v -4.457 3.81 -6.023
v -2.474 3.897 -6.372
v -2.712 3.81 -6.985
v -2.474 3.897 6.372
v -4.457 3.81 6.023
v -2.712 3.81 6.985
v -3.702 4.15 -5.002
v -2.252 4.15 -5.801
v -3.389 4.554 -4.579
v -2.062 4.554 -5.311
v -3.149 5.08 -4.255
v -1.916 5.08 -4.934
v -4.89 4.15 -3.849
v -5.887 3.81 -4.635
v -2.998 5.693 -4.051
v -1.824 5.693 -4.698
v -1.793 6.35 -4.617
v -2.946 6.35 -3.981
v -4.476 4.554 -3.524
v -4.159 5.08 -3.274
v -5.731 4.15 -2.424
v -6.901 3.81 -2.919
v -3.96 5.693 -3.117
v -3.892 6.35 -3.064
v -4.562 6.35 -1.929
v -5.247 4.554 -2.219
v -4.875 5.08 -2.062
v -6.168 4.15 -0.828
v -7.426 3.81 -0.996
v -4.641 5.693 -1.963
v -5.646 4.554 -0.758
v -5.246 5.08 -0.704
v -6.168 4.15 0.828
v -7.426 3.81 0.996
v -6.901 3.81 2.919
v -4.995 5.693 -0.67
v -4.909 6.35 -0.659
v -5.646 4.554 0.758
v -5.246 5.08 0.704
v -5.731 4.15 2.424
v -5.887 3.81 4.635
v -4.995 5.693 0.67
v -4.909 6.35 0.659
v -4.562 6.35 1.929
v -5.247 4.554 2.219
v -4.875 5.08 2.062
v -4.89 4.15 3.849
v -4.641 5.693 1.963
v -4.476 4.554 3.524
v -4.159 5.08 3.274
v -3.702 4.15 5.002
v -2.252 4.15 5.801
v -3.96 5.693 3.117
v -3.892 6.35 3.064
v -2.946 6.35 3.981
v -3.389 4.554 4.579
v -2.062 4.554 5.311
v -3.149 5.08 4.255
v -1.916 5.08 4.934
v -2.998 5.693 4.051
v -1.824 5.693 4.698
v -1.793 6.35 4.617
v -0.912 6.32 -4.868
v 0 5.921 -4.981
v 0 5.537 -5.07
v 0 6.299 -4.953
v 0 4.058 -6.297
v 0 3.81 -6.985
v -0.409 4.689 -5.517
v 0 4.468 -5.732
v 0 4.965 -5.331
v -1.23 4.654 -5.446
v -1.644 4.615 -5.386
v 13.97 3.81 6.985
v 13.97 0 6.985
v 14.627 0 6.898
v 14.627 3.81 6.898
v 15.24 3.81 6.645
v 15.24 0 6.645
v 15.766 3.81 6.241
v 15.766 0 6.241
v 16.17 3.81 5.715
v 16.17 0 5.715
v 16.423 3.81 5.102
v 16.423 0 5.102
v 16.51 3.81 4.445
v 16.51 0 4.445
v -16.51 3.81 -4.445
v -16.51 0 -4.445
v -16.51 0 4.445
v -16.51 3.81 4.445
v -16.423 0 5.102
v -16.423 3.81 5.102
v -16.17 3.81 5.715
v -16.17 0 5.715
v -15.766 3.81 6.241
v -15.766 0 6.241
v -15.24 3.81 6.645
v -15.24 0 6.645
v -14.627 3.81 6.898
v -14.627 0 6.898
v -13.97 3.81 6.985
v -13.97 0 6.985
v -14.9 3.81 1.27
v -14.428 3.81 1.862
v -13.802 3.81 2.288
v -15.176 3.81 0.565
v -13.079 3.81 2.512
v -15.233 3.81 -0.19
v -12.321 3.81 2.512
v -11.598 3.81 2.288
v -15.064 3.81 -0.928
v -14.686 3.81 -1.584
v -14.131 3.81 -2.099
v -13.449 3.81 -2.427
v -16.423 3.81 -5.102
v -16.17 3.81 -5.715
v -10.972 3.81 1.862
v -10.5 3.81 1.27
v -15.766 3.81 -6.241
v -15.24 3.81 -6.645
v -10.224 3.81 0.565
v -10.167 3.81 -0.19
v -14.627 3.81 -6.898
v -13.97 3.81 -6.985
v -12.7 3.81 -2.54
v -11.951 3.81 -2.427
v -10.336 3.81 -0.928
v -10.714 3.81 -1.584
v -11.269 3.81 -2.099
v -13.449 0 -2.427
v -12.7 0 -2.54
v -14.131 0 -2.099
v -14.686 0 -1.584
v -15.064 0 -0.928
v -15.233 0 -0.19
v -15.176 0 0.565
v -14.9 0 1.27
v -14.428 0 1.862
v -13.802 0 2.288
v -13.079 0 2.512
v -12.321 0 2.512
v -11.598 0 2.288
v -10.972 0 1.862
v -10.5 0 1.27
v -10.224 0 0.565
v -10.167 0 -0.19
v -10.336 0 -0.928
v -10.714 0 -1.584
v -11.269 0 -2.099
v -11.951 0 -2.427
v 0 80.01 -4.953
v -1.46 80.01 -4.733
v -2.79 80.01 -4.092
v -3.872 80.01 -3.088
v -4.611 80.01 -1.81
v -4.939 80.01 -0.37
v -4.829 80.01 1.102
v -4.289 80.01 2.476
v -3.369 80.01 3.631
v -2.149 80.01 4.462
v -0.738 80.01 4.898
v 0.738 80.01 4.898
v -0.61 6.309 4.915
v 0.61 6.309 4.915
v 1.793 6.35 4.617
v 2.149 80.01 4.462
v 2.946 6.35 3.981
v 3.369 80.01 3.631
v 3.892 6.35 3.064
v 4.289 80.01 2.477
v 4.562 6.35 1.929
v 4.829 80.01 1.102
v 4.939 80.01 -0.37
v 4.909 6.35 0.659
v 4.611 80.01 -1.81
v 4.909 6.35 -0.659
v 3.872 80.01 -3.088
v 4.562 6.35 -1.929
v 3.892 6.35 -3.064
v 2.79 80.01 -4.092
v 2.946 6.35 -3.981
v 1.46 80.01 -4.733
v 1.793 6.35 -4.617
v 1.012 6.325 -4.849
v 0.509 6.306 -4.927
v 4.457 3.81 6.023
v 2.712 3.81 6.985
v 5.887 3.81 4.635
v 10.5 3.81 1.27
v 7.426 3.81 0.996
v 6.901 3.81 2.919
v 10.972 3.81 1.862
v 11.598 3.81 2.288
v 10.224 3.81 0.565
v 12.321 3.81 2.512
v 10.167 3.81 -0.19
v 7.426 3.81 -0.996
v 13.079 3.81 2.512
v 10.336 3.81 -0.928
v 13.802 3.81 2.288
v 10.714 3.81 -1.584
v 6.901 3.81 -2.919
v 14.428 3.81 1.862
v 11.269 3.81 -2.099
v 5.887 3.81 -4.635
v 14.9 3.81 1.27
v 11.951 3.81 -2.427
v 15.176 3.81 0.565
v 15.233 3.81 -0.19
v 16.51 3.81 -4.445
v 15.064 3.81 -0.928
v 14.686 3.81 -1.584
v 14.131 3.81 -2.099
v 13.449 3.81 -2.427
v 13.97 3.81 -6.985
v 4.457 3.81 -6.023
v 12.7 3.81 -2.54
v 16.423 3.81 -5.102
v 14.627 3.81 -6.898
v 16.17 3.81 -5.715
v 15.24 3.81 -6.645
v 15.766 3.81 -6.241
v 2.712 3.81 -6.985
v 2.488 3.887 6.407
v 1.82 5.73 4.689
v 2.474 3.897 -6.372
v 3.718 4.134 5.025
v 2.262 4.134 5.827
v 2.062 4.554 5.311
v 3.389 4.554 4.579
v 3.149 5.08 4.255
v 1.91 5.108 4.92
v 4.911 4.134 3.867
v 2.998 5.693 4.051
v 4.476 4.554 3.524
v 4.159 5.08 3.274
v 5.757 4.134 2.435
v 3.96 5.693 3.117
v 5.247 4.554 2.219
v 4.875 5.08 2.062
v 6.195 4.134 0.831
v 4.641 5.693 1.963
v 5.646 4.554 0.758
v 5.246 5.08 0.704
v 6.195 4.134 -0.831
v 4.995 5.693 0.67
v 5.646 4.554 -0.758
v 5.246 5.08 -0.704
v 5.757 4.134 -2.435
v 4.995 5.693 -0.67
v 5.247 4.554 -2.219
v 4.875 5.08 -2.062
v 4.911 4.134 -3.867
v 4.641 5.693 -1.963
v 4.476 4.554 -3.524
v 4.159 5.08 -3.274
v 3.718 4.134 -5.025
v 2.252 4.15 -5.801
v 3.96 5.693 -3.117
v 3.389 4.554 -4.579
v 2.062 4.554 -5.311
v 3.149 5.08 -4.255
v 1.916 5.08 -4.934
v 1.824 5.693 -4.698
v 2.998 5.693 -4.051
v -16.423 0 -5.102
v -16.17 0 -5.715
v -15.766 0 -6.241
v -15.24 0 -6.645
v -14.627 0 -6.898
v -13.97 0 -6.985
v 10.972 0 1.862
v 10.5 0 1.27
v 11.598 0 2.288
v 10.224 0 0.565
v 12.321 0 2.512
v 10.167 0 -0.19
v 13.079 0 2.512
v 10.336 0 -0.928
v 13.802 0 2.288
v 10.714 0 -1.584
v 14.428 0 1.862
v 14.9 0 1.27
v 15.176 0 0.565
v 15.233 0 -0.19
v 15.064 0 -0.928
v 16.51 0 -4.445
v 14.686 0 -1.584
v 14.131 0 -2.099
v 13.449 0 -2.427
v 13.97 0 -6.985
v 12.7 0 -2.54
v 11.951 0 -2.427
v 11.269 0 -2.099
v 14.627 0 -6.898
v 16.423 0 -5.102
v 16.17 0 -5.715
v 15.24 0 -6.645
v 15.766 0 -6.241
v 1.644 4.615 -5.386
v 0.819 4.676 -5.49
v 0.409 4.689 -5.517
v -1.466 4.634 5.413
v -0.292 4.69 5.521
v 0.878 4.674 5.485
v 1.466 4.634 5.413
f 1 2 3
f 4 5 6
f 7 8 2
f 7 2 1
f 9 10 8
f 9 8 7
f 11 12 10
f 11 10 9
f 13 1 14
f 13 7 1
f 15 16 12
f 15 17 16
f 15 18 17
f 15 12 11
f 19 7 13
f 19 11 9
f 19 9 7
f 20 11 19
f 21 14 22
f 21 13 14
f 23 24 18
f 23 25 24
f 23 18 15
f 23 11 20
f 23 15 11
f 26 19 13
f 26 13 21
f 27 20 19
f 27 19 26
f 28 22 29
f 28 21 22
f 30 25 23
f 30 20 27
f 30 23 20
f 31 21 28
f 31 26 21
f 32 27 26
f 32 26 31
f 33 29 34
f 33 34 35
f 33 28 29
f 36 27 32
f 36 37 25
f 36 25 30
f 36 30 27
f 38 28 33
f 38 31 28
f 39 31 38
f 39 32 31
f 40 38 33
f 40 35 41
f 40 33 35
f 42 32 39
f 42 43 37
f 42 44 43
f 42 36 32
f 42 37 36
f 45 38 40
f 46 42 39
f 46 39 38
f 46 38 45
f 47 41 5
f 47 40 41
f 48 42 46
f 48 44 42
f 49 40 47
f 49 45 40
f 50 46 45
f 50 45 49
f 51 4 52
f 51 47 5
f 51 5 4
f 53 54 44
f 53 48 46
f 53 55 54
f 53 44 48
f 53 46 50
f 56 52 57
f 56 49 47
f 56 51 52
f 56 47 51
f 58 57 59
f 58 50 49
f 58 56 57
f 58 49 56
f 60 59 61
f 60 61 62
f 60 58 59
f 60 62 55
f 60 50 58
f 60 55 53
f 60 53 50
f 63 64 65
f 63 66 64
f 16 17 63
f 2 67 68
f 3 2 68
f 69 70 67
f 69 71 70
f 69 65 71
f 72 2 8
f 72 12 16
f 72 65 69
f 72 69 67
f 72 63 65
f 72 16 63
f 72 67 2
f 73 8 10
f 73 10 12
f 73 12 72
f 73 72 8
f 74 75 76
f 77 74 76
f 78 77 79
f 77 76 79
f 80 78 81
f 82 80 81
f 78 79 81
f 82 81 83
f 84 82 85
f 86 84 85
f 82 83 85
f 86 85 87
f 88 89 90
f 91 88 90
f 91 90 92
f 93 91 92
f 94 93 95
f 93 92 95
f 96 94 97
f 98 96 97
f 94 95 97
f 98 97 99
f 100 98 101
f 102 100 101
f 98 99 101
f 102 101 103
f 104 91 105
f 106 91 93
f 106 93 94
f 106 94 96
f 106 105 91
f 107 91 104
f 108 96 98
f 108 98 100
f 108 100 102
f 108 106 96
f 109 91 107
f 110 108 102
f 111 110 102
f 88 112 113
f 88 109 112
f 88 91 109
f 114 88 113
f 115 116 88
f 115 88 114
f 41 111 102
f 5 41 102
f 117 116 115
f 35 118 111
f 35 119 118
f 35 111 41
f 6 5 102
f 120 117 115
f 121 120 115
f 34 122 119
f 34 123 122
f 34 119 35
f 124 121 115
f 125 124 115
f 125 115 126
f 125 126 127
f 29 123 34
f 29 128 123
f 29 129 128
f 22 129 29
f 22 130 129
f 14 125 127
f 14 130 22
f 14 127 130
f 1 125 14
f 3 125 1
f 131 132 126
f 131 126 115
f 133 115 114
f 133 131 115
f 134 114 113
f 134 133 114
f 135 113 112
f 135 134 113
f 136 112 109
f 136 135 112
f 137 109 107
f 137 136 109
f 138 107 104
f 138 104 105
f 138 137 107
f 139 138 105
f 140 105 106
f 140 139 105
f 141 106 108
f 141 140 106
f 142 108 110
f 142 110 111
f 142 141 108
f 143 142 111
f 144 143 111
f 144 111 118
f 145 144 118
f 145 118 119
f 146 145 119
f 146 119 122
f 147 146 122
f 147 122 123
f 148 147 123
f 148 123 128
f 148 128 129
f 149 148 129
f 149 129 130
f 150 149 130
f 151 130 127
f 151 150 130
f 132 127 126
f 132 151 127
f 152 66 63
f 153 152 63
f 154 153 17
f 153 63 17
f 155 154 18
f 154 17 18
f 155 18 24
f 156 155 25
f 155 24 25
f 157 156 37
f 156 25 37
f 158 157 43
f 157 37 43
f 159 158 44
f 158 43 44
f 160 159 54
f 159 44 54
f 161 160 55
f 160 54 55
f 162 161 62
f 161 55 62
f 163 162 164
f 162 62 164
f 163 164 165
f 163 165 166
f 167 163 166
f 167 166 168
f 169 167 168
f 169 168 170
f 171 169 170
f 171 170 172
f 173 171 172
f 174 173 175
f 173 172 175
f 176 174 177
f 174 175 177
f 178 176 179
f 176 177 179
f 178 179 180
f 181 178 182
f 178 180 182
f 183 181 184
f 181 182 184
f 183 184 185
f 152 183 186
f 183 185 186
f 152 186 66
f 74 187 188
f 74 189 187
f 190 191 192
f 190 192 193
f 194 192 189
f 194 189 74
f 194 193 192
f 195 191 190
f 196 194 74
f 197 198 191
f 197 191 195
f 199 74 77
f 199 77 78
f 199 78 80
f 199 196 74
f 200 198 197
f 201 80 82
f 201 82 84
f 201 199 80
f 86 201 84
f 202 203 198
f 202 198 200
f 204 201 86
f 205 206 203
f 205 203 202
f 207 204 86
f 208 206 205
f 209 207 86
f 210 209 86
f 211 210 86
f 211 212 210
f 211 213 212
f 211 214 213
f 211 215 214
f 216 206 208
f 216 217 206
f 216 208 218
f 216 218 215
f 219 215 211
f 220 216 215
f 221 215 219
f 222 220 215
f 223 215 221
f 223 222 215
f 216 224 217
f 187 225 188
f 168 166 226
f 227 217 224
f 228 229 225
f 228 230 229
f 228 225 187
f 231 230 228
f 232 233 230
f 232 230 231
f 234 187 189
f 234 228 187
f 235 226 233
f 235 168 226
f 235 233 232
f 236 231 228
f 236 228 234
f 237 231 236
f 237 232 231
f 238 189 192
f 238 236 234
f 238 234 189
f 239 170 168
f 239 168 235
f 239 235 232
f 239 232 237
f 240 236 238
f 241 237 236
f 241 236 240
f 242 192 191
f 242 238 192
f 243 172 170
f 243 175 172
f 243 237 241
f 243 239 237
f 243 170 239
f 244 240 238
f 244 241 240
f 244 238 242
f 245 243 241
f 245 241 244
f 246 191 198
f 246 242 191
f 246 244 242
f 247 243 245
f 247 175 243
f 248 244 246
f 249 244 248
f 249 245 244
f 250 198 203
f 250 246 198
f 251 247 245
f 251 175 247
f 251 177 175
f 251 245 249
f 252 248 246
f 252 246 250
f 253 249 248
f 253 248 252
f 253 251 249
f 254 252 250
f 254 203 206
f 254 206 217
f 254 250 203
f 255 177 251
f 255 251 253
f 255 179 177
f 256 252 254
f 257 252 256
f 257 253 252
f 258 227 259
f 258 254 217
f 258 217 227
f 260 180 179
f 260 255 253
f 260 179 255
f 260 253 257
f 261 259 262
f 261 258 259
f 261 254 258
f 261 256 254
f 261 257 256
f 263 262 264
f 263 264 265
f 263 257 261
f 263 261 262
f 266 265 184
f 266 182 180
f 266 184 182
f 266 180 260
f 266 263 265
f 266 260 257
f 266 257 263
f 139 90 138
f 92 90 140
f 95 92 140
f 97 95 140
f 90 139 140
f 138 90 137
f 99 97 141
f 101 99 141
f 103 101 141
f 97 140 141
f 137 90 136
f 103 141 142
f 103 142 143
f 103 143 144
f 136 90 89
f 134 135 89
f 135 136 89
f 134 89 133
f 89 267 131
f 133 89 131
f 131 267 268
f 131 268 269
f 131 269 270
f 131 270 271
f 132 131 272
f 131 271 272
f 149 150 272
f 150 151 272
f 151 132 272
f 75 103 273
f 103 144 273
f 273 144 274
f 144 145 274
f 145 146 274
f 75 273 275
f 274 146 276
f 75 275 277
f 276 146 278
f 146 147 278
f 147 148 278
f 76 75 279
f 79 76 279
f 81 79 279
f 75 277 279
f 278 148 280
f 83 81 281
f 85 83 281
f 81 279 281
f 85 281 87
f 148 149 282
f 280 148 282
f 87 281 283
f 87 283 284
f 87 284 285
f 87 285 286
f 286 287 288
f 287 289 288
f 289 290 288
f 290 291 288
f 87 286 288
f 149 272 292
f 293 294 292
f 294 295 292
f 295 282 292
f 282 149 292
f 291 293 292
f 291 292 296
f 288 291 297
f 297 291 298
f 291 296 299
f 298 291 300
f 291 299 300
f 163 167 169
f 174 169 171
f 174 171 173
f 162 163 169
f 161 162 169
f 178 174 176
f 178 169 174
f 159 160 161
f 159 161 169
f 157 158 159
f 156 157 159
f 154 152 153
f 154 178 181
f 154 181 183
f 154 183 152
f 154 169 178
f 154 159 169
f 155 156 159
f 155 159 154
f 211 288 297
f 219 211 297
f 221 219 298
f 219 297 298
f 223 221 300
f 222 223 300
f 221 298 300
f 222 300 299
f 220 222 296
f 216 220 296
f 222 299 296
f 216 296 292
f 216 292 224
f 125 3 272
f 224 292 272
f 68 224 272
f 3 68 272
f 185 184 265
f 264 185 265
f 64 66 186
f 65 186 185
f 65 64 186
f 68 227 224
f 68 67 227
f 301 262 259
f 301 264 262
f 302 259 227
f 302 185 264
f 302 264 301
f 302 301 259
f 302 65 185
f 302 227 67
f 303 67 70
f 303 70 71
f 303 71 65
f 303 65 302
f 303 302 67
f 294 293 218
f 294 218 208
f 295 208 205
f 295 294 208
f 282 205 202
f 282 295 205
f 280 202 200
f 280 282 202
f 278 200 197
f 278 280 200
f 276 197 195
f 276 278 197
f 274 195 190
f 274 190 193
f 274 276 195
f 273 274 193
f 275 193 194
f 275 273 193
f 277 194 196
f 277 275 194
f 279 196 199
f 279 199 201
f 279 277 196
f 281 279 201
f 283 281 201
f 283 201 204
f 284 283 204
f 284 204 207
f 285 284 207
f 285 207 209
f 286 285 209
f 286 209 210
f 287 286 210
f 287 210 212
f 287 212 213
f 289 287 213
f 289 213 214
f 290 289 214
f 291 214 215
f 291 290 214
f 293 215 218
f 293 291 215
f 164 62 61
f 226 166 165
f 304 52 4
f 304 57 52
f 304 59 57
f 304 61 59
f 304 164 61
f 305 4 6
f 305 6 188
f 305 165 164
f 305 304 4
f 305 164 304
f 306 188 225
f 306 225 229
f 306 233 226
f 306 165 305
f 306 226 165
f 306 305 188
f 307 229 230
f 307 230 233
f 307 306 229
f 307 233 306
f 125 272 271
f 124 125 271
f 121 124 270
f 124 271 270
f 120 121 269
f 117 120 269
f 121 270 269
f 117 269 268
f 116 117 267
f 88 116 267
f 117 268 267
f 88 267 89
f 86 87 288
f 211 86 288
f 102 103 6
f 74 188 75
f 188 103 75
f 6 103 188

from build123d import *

# Parameters (mm, degrees)
SKETCH1_R           = 2.54
BOSS_EXTRUDE1_DEPTH = 3.81
SKETCH2_R           = 4.953
BOSS_EXTRUDE2_DEPTH = 76.2
FILLET1_R           = 2.54


with BuildPart() as part:
    # Sketch1 → Boss-Extrude1 (new body)
    with BuildSketch(Plane(origin=(0, 0, 0), x_dir=(1, 0, 0), z_dir=(0, 1, 0))):
        with BuildLine():
            Line((-13.97, -6.985), (13.97, -6.985))
            ThreePointArc((13.97, -6.985), (15.766051224, -6.241051224), (16.51, -4.445))
            Line((16.51, -4.445), (16.51, 4.445))
            ThreePointArc((16.51, 4.445), (15.766051224, 6.241051224), (13.97, 6.985))
            Line((13.97, 6.985), (-13.97, 6.985))
            ThreePointArc((-13.97, 6.985), (-15.766051224, 6.241051224), (-16.51, 4.445))
            Line((-16.51, 4.445), (-16.51, -4.445))
            ThreePointArc((-16.51, -4.445), (-15.766051224, -6.241051224), (-13.97, -6.985))
        make_face()
        with Locations(Location((-12.7, 0, 0), (0, 0, 90))):
            Circle(SKETCH1_R, mode=Mode.SUBTRACT)
        with Locations(Location((12.7, 0, 0), (0, 0, 90))):
            Circle(SKETCH1_R, mode=Mode.SUBTRACT)
    extrude(amount=BOSS_EXTRUDE1_DEPTH)

    # Sketch2 → Boss-Extrude2 (add)
    with BuildSketch(Plane(origin=(0, 3.81, 0), x_dir=(1, 0, 0), z_dir=(0, 1, 0))):
        with Locations(Location((0, 0, 0), (0, 0, 90))):
            Circle(SKETCH2_R)
    extrude(amount=BOSS_EXTRUDE2_DEPTH)

    # Fillet1
    fillet1_edges = [part.edges().sort_by_distance(p)[0] for p in [
        (0, 3.81, 4.953),
    ]]
    fillet(fillet1_edges, radius=FILLET1_R)


solid = part.part
